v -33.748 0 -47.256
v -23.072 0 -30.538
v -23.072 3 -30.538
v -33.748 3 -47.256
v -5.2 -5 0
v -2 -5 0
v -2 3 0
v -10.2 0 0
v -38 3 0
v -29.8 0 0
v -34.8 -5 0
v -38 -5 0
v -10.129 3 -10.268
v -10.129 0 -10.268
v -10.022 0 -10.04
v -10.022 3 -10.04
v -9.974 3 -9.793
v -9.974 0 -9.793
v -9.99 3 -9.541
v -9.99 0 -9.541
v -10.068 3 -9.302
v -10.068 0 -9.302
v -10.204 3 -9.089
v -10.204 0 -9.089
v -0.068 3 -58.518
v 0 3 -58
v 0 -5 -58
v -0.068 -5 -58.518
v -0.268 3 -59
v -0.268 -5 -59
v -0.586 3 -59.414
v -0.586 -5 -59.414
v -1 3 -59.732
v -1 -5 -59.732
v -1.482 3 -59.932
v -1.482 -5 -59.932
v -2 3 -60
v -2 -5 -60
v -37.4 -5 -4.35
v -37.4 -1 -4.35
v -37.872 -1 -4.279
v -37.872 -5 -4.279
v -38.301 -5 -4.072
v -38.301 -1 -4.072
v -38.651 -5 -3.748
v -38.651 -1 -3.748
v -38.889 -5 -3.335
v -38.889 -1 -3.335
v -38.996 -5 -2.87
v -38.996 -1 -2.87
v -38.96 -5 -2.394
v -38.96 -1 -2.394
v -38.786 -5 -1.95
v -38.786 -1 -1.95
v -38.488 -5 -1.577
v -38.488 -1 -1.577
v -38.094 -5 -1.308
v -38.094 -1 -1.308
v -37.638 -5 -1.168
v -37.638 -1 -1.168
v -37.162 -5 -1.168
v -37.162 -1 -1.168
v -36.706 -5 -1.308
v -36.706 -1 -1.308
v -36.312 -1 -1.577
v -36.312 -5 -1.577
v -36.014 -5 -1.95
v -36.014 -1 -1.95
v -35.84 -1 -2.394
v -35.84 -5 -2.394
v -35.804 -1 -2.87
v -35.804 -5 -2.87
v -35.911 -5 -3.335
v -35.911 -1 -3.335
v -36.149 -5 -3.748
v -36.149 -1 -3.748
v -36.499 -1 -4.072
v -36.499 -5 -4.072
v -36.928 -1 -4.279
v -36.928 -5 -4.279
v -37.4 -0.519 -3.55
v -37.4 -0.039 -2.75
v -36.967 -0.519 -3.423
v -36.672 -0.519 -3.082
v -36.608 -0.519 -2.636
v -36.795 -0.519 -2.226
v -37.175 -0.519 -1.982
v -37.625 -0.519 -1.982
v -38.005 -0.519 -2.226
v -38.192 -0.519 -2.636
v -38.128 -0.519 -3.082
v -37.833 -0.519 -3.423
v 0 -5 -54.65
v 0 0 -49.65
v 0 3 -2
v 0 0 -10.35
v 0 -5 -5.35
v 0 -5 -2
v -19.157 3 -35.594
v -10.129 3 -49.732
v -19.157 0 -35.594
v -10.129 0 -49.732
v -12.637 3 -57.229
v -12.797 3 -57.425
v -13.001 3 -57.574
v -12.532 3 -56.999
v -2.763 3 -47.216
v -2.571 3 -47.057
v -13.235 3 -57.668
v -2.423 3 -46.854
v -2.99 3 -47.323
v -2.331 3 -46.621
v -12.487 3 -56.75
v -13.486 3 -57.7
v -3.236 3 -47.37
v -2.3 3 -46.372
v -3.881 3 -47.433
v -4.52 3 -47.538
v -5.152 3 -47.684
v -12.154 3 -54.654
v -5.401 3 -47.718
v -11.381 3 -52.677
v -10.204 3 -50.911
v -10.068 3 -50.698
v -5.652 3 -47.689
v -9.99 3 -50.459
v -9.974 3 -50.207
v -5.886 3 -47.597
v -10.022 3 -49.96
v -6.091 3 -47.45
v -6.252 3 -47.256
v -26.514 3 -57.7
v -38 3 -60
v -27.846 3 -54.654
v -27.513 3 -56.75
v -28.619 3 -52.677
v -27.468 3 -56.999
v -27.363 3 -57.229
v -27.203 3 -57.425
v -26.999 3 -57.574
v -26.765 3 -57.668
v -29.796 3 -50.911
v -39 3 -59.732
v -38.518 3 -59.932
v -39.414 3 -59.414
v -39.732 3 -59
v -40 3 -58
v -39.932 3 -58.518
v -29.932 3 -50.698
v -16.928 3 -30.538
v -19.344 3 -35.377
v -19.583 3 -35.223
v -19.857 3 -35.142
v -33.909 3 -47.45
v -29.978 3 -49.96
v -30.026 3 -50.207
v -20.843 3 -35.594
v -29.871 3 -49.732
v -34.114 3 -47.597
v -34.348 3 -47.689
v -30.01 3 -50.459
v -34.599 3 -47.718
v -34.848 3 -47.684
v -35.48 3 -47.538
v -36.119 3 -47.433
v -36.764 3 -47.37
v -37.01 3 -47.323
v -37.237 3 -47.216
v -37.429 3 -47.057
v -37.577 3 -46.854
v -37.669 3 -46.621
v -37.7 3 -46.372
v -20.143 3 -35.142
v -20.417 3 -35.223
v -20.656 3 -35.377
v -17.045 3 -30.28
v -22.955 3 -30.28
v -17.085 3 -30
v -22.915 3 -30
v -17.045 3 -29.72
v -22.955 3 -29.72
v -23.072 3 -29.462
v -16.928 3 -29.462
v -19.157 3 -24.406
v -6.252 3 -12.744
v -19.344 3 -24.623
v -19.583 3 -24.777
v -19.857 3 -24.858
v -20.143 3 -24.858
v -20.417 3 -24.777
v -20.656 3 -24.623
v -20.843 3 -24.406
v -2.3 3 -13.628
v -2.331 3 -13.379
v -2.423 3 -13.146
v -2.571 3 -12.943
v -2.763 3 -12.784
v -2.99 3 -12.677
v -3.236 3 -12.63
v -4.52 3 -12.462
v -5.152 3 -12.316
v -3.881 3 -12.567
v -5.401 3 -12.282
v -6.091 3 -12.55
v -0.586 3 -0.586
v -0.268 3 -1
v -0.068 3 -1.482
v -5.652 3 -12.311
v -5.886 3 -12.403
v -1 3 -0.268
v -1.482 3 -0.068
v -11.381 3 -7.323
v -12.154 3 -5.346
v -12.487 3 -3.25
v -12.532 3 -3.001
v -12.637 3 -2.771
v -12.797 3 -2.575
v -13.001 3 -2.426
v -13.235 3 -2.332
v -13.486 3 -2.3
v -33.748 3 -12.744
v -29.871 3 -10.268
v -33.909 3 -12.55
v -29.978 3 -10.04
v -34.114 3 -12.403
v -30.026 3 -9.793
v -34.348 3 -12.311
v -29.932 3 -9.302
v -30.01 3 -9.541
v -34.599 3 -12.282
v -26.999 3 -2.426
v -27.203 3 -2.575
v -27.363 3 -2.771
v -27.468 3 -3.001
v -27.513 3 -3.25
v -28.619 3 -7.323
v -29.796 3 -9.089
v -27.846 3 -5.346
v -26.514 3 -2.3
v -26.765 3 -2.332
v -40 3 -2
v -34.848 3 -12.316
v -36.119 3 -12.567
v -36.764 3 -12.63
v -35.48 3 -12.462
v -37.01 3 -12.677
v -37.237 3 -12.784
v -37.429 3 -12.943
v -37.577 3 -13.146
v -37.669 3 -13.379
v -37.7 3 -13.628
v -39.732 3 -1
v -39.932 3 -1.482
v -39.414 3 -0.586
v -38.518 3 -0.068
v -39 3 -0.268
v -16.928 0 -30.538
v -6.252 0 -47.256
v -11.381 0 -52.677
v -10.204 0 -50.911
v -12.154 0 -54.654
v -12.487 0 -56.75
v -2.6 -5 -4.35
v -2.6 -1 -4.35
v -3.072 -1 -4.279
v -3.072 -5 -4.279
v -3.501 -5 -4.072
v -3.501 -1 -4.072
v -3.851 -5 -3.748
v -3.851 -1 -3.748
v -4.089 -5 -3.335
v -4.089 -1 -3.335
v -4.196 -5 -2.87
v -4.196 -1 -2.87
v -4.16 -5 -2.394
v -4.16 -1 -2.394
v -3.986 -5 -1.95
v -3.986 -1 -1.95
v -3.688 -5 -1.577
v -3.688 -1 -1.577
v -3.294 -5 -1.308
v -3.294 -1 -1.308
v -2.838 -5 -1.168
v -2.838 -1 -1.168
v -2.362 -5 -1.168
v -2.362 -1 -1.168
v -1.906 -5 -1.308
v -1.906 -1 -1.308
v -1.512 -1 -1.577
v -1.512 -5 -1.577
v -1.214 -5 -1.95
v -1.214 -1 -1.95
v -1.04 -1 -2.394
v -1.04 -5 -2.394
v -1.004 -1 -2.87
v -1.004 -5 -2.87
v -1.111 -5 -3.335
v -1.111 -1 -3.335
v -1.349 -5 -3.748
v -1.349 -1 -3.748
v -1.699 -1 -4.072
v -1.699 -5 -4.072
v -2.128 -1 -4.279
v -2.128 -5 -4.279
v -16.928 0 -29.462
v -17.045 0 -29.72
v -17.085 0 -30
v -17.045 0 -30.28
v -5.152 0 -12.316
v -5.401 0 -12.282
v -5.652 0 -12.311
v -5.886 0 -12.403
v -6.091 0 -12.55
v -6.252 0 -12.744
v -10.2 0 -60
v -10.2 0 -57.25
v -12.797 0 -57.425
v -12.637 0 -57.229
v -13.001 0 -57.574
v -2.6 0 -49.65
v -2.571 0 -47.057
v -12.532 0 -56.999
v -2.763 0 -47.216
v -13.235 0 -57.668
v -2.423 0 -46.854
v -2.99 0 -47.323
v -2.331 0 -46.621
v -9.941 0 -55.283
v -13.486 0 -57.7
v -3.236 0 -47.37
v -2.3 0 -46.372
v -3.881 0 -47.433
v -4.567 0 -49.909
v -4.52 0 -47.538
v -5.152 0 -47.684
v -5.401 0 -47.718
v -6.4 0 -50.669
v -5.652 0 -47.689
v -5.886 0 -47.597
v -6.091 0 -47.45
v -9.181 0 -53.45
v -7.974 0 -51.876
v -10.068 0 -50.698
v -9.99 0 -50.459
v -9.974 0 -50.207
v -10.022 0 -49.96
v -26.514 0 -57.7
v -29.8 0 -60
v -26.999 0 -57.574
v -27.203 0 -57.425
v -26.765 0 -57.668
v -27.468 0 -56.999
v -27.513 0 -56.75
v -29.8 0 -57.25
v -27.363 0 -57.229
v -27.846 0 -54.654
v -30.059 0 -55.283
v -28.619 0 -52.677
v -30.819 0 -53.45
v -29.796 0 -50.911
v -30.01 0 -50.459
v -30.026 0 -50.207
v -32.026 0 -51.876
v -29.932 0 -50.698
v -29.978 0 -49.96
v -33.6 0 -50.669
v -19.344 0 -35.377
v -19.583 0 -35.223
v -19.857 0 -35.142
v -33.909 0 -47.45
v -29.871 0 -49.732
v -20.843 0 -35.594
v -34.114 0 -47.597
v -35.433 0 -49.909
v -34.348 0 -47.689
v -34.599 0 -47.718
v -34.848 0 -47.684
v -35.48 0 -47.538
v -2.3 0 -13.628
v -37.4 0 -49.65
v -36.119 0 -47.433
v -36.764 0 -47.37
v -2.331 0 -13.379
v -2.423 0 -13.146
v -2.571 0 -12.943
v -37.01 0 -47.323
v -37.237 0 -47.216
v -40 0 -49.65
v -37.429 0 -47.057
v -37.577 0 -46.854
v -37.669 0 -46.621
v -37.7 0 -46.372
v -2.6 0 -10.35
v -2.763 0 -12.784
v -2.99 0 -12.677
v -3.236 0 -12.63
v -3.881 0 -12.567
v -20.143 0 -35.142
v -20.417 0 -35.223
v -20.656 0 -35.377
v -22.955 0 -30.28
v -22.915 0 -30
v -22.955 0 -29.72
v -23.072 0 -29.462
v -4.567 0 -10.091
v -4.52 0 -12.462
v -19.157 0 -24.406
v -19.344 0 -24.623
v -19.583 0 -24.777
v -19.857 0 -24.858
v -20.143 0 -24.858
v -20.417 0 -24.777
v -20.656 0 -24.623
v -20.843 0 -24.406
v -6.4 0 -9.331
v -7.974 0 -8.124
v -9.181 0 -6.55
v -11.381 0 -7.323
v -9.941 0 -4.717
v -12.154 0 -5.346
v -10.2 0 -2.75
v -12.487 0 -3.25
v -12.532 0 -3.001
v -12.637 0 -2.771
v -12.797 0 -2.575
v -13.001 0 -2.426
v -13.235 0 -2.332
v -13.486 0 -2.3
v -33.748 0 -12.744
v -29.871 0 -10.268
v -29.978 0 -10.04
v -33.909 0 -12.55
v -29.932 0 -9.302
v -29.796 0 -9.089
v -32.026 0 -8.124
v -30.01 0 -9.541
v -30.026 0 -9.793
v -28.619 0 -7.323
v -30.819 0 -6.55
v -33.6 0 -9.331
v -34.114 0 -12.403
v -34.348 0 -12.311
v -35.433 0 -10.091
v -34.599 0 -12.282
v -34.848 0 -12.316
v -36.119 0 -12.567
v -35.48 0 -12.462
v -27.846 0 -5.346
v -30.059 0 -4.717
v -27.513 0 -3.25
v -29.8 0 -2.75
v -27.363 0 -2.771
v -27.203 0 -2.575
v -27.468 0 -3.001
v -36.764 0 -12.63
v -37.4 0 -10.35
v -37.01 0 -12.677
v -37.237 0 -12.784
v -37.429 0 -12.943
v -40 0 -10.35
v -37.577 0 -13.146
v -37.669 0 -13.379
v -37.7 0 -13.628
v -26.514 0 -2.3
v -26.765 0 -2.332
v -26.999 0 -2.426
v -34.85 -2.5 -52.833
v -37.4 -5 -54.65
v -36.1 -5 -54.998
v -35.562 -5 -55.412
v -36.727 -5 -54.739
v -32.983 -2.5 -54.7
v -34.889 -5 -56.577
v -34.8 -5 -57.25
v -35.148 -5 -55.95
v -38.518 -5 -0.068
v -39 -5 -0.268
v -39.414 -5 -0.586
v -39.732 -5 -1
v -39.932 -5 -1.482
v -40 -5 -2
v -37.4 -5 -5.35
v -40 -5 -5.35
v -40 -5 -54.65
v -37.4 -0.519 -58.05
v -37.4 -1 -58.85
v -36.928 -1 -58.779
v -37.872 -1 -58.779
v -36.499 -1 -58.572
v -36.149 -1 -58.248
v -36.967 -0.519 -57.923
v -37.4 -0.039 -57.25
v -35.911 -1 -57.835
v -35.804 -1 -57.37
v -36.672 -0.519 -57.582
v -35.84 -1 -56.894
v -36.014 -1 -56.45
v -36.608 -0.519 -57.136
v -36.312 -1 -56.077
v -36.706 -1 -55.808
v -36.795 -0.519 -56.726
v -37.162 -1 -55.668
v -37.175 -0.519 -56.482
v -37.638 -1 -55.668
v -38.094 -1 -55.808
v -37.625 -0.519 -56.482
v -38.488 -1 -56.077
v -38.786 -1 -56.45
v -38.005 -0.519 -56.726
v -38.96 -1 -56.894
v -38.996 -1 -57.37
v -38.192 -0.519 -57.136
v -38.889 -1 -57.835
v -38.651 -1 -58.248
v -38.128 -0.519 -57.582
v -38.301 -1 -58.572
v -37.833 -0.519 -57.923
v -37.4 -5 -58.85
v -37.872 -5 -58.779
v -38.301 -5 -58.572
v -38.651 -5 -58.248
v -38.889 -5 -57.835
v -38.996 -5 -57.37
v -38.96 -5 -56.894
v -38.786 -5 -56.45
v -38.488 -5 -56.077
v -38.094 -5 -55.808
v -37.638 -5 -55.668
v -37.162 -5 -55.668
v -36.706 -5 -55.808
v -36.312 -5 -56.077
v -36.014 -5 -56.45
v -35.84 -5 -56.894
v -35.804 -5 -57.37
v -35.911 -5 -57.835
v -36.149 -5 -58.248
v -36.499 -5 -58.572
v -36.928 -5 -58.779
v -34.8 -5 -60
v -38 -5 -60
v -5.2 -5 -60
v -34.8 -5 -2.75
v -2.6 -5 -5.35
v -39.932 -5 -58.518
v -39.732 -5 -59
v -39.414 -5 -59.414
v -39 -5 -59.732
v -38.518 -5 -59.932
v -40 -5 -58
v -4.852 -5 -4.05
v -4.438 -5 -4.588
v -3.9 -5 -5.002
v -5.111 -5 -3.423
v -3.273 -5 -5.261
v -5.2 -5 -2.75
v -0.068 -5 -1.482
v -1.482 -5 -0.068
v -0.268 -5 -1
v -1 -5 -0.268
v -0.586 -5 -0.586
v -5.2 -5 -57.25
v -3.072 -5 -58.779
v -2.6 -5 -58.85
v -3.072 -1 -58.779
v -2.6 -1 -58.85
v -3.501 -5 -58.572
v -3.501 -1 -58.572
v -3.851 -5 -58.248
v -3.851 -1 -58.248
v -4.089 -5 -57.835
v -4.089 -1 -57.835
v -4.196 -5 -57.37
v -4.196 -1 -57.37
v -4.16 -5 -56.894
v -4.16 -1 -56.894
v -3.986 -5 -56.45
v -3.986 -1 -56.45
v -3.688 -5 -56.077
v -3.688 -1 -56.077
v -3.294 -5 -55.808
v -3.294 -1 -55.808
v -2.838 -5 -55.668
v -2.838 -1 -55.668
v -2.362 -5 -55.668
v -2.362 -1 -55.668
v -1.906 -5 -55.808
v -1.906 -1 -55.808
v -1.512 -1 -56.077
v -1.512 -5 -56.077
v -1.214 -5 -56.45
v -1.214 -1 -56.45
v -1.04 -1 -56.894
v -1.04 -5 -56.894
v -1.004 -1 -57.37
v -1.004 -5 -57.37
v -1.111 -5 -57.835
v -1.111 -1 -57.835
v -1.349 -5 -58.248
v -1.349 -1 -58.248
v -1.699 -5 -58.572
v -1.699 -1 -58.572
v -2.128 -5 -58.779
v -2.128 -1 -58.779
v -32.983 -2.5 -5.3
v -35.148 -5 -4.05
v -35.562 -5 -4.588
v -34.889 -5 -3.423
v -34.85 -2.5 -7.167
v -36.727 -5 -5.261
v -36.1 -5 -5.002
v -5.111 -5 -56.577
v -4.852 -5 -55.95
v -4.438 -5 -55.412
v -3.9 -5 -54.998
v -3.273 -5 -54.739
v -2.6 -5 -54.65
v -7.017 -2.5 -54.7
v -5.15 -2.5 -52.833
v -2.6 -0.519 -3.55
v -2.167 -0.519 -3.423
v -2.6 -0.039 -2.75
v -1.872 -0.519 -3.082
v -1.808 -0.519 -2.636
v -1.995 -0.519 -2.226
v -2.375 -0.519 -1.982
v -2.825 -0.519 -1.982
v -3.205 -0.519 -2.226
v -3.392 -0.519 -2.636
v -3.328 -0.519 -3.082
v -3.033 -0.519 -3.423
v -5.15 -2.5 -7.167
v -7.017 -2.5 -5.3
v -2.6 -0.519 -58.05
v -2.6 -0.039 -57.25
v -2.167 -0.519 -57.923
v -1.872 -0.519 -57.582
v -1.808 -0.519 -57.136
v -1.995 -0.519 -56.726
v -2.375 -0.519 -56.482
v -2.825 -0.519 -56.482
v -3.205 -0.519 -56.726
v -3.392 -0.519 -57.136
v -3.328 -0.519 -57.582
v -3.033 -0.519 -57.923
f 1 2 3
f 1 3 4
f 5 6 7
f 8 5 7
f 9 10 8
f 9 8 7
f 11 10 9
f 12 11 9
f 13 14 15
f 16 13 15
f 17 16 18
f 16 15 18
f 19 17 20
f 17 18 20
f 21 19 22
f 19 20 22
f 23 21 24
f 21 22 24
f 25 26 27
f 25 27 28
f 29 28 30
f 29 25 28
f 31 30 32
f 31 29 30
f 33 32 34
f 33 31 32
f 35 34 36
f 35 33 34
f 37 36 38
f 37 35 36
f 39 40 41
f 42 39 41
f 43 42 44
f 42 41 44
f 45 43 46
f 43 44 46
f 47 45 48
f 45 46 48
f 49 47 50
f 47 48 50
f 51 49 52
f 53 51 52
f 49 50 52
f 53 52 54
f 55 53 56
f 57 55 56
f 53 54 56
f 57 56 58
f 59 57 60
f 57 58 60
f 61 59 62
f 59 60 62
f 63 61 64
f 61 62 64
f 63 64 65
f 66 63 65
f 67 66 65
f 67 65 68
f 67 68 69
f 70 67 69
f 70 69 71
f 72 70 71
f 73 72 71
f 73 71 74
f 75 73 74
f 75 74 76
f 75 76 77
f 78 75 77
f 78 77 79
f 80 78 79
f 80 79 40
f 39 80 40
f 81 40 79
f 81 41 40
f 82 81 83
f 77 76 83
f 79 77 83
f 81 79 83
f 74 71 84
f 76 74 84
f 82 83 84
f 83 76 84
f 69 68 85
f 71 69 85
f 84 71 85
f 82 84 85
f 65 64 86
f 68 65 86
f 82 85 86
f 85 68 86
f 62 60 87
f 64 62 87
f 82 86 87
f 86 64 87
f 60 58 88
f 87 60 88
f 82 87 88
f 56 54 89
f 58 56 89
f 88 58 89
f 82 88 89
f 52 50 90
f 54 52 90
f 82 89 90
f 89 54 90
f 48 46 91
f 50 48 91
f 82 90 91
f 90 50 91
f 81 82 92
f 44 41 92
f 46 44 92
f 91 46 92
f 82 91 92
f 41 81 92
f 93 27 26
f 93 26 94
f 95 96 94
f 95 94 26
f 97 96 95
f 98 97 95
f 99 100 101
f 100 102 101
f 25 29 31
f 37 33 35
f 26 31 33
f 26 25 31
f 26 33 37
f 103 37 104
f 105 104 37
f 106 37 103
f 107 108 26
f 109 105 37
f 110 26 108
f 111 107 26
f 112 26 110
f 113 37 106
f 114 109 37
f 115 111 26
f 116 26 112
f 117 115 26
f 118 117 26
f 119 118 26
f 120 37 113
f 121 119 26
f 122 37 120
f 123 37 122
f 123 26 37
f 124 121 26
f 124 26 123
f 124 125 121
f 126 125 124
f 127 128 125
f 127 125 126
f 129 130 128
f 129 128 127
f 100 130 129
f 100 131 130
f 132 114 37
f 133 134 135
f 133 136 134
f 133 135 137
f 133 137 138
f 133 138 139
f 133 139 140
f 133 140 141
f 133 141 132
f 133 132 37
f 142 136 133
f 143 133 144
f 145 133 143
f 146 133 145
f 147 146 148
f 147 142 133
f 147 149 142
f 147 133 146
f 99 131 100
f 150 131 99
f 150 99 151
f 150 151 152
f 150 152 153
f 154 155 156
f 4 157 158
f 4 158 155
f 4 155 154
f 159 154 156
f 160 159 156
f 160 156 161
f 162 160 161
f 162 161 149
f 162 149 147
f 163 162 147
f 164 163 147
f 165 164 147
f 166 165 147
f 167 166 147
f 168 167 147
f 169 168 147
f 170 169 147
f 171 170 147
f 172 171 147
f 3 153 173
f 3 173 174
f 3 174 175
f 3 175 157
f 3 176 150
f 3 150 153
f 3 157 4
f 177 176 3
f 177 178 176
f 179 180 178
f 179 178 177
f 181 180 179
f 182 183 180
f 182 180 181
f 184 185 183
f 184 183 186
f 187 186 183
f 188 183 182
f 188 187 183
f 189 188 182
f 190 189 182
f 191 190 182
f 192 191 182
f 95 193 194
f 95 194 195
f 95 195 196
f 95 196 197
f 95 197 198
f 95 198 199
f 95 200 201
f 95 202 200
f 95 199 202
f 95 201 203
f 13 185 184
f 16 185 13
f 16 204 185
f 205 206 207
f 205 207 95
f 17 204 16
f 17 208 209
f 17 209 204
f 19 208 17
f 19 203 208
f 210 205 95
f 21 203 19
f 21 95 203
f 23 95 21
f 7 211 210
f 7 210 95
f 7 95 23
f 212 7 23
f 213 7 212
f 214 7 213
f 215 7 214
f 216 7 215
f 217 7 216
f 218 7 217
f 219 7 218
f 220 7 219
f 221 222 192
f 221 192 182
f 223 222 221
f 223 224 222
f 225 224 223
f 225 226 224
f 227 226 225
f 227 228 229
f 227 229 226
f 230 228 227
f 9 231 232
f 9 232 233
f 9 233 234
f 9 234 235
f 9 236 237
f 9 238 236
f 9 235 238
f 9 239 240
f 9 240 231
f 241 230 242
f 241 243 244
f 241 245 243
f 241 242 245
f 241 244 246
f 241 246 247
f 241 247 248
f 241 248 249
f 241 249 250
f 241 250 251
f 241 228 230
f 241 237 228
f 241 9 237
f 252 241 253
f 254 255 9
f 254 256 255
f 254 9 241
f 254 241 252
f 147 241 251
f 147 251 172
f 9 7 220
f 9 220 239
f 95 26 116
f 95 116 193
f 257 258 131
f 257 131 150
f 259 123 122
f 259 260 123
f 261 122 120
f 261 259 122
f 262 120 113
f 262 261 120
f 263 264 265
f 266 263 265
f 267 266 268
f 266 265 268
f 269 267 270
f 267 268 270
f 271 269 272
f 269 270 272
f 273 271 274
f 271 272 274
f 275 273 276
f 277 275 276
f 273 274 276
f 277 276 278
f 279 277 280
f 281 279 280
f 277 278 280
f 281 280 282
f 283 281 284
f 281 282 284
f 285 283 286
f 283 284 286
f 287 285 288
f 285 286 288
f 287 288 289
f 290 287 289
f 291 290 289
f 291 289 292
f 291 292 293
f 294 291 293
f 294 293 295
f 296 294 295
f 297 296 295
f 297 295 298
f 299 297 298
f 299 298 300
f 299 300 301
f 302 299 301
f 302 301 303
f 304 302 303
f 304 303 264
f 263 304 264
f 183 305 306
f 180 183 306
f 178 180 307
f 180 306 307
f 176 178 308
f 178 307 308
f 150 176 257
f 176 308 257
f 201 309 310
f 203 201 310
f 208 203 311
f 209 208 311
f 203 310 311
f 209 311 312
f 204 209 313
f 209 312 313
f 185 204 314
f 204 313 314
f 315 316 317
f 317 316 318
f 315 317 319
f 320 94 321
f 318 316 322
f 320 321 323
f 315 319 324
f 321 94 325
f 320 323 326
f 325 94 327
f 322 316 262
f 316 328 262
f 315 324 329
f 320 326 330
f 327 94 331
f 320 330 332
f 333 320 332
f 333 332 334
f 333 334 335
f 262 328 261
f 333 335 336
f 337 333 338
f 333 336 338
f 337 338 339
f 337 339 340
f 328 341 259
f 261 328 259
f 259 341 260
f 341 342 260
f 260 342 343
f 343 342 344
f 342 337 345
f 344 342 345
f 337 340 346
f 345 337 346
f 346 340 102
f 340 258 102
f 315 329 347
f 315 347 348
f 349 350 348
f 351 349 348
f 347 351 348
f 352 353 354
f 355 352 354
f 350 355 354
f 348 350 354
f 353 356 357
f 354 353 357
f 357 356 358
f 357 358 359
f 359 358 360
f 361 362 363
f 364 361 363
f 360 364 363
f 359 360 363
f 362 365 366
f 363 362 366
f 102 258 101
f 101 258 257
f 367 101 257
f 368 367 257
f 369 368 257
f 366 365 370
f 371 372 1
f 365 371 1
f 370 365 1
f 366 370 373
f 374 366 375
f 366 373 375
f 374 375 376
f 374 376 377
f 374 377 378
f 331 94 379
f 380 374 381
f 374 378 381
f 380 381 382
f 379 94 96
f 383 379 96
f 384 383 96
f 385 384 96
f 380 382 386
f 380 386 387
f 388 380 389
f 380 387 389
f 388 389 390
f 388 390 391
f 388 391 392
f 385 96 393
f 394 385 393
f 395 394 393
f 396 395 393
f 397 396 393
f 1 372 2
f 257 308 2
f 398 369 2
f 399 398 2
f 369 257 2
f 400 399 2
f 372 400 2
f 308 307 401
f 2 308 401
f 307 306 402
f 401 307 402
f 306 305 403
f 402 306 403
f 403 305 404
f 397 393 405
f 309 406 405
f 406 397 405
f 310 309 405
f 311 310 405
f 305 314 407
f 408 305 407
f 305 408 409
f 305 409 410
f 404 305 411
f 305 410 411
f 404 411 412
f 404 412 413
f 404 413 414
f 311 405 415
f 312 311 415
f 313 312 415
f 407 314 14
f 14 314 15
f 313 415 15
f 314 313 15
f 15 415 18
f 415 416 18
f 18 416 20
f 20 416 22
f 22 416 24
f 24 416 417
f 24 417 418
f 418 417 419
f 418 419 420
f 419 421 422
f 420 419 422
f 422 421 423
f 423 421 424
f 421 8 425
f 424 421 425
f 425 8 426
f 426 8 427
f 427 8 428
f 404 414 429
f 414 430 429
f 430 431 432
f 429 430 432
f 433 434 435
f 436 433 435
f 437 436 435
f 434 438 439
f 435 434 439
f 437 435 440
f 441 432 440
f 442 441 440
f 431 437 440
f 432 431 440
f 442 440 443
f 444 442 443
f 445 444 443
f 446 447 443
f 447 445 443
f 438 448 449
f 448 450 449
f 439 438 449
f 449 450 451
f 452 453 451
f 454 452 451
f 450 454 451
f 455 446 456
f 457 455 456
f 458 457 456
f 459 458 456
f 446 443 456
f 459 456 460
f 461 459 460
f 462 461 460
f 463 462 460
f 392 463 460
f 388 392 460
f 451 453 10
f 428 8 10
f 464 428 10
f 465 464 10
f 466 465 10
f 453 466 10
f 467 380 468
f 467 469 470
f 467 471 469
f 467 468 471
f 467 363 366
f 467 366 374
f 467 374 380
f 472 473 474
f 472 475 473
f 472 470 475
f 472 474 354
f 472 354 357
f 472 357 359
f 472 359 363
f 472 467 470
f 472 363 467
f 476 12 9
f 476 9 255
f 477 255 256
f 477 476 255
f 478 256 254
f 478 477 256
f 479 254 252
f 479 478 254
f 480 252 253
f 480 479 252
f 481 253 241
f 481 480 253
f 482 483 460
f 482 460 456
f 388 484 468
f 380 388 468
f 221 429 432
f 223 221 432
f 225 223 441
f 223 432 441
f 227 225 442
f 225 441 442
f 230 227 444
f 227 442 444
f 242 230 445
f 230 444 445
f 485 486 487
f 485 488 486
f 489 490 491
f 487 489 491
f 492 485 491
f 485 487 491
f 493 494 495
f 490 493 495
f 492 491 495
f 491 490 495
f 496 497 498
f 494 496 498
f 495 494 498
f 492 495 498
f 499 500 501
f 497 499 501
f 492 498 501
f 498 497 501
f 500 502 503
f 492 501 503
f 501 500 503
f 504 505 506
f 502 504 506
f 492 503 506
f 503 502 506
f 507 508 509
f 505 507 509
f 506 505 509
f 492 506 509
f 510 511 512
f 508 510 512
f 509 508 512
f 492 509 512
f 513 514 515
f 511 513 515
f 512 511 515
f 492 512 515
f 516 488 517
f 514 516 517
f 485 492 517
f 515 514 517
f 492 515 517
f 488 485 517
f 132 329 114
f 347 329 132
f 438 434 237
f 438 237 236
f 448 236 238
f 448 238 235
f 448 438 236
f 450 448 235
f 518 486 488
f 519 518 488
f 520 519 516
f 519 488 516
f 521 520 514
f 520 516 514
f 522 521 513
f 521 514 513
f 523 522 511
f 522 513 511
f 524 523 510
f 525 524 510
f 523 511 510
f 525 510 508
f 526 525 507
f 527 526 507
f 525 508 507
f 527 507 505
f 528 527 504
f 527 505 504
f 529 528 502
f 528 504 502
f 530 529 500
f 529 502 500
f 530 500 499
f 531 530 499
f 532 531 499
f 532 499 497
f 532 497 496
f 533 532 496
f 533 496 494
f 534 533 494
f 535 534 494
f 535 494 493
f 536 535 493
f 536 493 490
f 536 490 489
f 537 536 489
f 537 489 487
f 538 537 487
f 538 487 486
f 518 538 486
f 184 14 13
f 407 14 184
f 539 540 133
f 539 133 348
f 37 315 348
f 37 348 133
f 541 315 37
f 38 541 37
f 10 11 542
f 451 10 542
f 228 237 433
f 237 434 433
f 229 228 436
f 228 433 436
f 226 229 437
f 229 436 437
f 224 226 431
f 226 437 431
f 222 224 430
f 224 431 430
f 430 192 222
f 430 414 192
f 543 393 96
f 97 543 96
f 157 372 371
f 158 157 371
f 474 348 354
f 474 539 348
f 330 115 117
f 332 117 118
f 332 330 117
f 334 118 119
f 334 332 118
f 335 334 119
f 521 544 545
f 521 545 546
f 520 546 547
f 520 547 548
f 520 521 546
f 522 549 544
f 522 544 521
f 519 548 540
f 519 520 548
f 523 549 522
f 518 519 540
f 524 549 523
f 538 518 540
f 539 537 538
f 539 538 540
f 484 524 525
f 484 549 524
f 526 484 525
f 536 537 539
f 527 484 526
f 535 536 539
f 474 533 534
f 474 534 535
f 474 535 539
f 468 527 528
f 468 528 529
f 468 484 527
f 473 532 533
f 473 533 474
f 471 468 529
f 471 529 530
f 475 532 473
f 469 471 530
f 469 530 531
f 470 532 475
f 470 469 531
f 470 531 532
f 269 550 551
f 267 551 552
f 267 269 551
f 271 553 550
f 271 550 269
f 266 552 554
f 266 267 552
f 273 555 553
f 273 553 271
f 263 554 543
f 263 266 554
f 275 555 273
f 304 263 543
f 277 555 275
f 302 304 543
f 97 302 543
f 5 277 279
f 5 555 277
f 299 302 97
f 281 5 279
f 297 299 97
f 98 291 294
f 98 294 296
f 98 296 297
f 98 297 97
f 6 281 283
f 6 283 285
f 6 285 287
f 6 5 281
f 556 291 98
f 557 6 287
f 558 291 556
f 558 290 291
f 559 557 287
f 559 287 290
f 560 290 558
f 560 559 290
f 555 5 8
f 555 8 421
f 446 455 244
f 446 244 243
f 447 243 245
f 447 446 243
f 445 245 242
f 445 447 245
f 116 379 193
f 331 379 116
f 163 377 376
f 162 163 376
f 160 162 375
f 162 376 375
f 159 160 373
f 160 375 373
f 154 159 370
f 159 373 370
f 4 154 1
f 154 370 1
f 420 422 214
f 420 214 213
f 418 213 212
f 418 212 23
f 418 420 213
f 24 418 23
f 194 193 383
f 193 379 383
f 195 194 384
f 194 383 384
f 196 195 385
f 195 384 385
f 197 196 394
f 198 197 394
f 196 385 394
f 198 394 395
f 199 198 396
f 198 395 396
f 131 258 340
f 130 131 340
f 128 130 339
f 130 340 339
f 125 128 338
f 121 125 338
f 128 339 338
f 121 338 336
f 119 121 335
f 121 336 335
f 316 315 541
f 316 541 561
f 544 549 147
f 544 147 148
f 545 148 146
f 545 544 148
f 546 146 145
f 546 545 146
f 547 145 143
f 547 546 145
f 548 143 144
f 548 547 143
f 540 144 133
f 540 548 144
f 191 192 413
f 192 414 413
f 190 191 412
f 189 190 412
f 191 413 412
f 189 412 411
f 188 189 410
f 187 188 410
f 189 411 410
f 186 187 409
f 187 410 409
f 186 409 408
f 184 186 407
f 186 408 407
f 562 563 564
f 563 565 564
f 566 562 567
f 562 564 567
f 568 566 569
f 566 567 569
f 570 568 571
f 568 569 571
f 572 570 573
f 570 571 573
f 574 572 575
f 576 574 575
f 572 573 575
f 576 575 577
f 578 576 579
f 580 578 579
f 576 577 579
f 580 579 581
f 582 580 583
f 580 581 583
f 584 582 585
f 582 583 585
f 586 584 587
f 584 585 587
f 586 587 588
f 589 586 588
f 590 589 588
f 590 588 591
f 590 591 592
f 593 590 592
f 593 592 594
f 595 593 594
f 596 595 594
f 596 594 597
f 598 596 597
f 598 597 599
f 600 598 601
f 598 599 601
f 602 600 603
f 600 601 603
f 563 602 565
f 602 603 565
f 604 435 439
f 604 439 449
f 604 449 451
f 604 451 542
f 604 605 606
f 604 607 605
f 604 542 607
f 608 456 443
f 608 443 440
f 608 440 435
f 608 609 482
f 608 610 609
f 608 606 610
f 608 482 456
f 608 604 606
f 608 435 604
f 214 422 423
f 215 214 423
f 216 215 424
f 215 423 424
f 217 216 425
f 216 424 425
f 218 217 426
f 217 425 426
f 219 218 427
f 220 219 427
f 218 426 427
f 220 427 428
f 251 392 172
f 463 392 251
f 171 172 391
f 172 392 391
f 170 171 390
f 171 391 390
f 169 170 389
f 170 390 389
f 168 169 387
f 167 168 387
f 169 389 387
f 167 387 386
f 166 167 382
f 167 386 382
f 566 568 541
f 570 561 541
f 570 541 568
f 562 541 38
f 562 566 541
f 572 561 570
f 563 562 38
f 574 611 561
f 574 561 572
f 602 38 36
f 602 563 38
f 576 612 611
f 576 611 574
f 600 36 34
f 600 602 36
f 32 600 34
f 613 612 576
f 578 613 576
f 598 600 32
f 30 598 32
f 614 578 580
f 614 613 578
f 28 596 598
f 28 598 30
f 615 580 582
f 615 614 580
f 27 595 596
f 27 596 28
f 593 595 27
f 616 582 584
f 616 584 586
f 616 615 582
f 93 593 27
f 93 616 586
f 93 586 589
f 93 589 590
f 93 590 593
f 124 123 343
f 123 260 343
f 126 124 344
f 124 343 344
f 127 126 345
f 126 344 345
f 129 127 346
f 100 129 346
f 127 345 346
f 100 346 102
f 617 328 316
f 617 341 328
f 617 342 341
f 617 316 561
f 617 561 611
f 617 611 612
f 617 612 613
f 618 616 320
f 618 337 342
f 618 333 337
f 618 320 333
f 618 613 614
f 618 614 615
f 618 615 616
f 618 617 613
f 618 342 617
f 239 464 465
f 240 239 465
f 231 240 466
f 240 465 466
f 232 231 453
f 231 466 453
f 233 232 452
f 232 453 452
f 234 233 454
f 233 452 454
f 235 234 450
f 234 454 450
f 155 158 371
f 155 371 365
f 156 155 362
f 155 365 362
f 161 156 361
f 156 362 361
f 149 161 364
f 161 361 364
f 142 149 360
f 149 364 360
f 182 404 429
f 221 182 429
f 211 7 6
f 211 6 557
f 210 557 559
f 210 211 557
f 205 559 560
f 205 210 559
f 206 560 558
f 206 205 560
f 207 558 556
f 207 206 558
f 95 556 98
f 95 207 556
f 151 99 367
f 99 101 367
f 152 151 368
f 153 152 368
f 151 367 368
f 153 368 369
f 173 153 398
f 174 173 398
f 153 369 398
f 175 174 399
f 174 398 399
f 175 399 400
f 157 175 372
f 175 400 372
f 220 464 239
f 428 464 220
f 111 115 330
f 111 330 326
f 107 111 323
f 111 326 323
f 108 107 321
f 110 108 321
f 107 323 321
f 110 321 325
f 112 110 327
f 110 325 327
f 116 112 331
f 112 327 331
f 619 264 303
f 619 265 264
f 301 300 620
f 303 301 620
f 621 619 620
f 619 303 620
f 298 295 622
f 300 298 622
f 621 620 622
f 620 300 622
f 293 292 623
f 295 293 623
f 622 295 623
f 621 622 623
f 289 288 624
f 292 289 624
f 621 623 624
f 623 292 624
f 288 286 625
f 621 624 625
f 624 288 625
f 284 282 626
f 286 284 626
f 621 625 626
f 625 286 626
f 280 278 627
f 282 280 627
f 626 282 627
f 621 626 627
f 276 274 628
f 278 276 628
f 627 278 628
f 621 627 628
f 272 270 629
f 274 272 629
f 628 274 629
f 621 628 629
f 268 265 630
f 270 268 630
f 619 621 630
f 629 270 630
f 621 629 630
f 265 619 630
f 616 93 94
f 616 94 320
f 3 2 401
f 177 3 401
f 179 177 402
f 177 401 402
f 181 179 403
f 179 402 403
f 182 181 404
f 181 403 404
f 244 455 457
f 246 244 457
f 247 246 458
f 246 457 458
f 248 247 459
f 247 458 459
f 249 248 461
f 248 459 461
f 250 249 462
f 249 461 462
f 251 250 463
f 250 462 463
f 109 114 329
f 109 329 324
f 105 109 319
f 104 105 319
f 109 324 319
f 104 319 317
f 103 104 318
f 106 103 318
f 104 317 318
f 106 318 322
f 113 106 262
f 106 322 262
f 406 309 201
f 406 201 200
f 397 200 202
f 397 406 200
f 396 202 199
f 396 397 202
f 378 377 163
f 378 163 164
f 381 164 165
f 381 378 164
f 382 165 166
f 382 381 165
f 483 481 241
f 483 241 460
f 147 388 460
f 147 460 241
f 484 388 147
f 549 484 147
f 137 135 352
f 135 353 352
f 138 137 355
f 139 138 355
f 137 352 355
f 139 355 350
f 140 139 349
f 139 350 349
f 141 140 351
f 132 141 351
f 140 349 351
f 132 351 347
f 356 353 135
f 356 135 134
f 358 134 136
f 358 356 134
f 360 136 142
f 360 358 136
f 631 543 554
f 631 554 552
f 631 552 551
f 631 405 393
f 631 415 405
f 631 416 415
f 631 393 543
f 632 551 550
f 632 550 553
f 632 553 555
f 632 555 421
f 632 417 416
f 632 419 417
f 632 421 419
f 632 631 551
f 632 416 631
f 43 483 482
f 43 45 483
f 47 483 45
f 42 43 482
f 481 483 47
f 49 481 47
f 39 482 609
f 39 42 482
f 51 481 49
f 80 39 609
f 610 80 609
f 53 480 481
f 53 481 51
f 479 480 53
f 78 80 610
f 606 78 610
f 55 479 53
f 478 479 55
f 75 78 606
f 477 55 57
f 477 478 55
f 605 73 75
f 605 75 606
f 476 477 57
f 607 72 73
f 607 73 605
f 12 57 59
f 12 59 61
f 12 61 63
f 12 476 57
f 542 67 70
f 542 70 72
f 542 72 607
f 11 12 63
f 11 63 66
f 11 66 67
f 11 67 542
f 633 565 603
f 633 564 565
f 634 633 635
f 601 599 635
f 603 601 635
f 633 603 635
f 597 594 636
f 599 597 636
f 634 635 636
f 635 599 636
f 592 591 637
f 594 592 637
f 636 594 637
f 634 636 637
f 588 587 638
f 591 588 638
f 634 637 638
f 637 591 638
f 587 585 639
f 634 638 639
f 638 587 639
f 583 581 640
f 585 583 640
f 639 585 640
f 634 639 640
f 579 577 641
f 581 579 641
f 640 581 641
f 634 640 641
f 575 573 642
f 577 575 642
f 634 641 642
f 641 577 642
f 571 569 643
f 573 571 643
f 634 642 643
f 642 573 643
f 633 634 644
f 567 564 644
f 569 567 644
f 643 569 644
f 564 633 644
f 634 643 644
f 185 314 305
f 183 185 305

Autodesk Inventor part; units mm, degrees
ref_plane "YZ Plane" through (0, 0, 0) normal (1, 0, 0) x (0, 1, 0)
ref_plane "XZ Plane" through (0, 0, 0) normal (0, 1, 0) x (-1, 0, 0)
ref_plane "XY Plane" through (0, 0, 0) normal (0, 0, 1) x (1, 0, 0)
sketch "Sketch1" plane through (0, 0, 0) normal (0, 1, 0) x (-1, 0, 0)
  line L0 (0, 0) -> (40, 0)
  line L1 (40, 0) -> (40, -60)
  line L2 (40, -60) -> (0, -60)
  line L3 (0, -60) -> (0, 0)
  circle A0 centre (2.6, -2.75) radius 1.27
  circle A1 centre (37.4, -2.75) radius 1.27
  circle A2 centre (37.4, -57.25) radius 1.27
  circle A3 centre (2.6, -57.25) radius 1.27
  dimension "d1" = 40
  dimension "d2" = 60
  dimension "d15" = 2.54
  dimension "d20" = 2.75
  dimension "d21" = 2.6
  dimension "d22" = 2.54
  dimension "d23" = 2.75
  dimension "d24" = 2.6
  dimension "d25" = 2.54
  dimension "d26" = 2.54
  dimension "d27" = 2.75
  dimension "d28" = 2.75
  dimension "d29" = 2.6
  dimension "d30" = 2.6
extrude "Extrusion1" add sketch "Sketch1" along normal blind 3 contours L0 L1 L2 L3 | A0 | A1 | A2 | A3
sketch "Sketch2" plane through (0, 0, 0) normal (0, -1, 0) x (1, 0, 0)
  line L0 (-40, 0) -> (0, 0) projected
  line L1 (0, -60) -> (-40, -60) projected
  arc A0 (-5.2, -2.75) -> (-2.6, -5.35) centre (-2.6, -2.75) ccw
  line L2 (0, 0) -> (0, -60) projected
  arc A1 (-2.6, -54.65) -> (-5.2, -57.25) centre (-2.6, -57.25) ccw
  arc A2 (-34.8, -57.25) -> (-37.4, -54.65) centre (-37.4, -57.25) ccw
  line L3 (-40, -60) -> (-40, 0) projected
  arc A3 (-37.4, -5.35) -> (-34.8, -2.75) centre (-37.4, -2.75) ccw
  line L4 (-34.8, -57.25) -> (-34.8, -60)
  line L5 (-34.8, -2.75) -> (-34.8, 0)
  line L6 (-5.2, -57.25) -> (-5.2, -60)
  line L7 (-5.2, -2.75) -> (-5.2, 0)
  line L8 (-37.4, -54.65) -> (-40, -54.65)
  line L9 (0, -5.35) -> (-2.6, -5.35)
  line L10 (-37.4, -5.35) -> (-40, -5.35)
  line L11 (-40, -54.65) -> (-37.4, -54.65)
  line L12 (-2.6, -54.65) -> (0, -54.65)
extrude "Extrusion2" add sketch "Sketch2" along normal blind 5 contours L0 L5 A3 L10 L3 | L0 L2 L9 A0 L7 | L8 A2 L4 L1 L3 | L2 L1 L6 A1 L12
sketch "Sketch4" plane through (0, -5, 0) normal (0, -1, 0) x (1, 0, 0)
  arc A0 (-2.6, -54.65) -> (-5.2, -57.25) centre (-2.6, -57.25) ccw projected
  arc A1 (-34.8, -57.25) -> (-37.4, -54.65) centre (-37.4, -57.25) ccw projected
  arc A2 (-5.2, -2.75) -> (-2.6, -5.35) centre (-2.6, -2.75) ccw projected
  arc A3 (-37.4, -5.35) -> (-34.8, -2.75) centre (-37.4, -2.75) ccw projected
  point P0 (0, 0)
hole "Hole2" at (-2.6, -5, -57.25) at (-37.4, -5, -57.25) at (-2.6, -5, -2.75) at (-37.4, -5, -2.75) direction (0, 1, 0) diameter 3.2 depth 4 tip angle 118
chamfer "Chamfer1" distance 5 angle 45 12 edges at (-1.3, 0, -54.65) (-4.4385, 0, -55.4115) (-5.2, 0, -58.625) (-35.5615, 0, -55.4115) (-34.8, 0, -58.625) (-38.7, 0, -54.65) (-35.5615, 0, -4.5885) (-38.7, 0, -5.35) (-34.8, 0, -1.375) (-1.3, 0, -5.35) (-4.4385, 0, -4.5885) (-5.2, 0, -1.375)
sketch "Sketch5" plane through (0, 0, 0) normal (0, -1, 0) x (1, 0, 0)
  line L0 (-10.2, 0) -> (-10.2, -2.75) projected
  line L1 (-29.8, 0) -> (-10.2, 0) projected
  line L2 (-29.8, -2.75) -> (-29.8, 0) projected
  arc A0 (-37.4, -10.35) -> (-29.8, -2.75) centre (-37.4, -2.75) ccw projected
  line L3 (-40, -10.35) -> (-37.4, -10.35) projected
  line L4 (-40, -49.65) -> (-40, -10.35) projected
  line L5 (-37.4, -49.65) -> (-40, -49.65) projected
  arc A1 (-29.8, -57.25) -> (-37.4, -49.65) centre (-37.4, -57.25) ccw projected
  line L6 (-29.8, -60) -> (-29.8, -57.25) projected
  line L7 (-10.2, -60) -> (-29.8, -60) projected
  line L8 (-10.2, -57.25) -> (-10.2, -60) projected
  arc A2 (-2.6, -49.65) -> (-10.2, -57.25) centre (-2.6, -57.25) ccw projected
  line L9 (0, -49.65) -> (-2.6, -49.65) projected
  line L10 (0, -10.35) -> (0, -49.65) projected
  line L11 (-2.6, -10.35) -> (0, -10.35) projected
  arc A3 (-10.2, -2.75) -> (-2.6, -10.35) centre (-2.6, -2.75) ccw projected
  line L12 (-12.5, -57.25) -> (-12.5, -57.7)
  line L13 (-13.4861, -57.7) -> (-26.5139, -57.7)
  line L14 (-27.5, -57.7) -> (-27.5, -57.25)
  line L15 (-37.4, -47.35) -> (-37.7, -47.35)
  line L16 (-37.7, -46.3725) -> (-37.7, -13.6275)
  line L17 (-37.7, -12.65) -> (-37.4, -12.65)
  line L18 (-27.5, -2.75) -> (-27.5, -2.3)
  line L19 (-26.5139, -2.3) -> (-13.4861, -2.3)
  line L20 (-12.5, -2.3) -> (-12.5, -2.75)
  line L21 (-2.6, -12.65) -> (-2.3, -12.65)
  line L22 (-2.3, -13.6275) -> (-2.3, -46.3725)
  line L23 (-2.3, -47.35) -> (-2.6, -47.35)
  line L24 (0, -60) -> (-40, -60) projected
  arc A4 (-5.2, -2.75) -> (-2.6, -5.35) centre (-2.6, -2.75) ccw projected
  circle A5 centre (-37.4, -2.75) radius 1.6 projected
  line L25 (-0.6615, -56.0122) -> (-2.3, -53.4461)
  line L26 (-4.5385, -58.4878) -> (-5.0416, -57.7)
  line L27 (-34.9584, -57.7) -> (-35.4615, -58.4878)
  line L28 (-37.7, -53.4461) -> (-39.3385, -56.0122)
  arc A6 (-3.2358, -47.3704) -> (-5.1517, -47.6845) centre (-2.6, -57.25) ccw
  arc A7 (-10.2041, -50.9106) -> (-12.4874, -56.7505) centre (-2.6, -57.25) ccw
  arc A8 (-27.5126, -56.7505) -> (-29.7959, -50.9106) centre (-37.4, -57.25) ccw
  arc A9 (-34.8483, -47.6845) -> (-36.7642, -47.3704) centre (-37.4, -57.25) ccw
  arc A10 (-36.7642, -12.6296) -> (-34.8483, -12.3155) centre (-37.4, -2.75) ccw
  arc A11 (-29.7959, -9.0894) -> (-27.5126, -3.2495) centre (-37.4, -2.75) ccw
  arc A12 (-12.4874, -3.2495) -> (-10.2041, -9.0894) centre (-2.6, -2.75) ccw
  arc A13 (-5.1517, -12.3155) -> (-3.2358, -12.6296) centre (-2.6, -2.75) ccw
  line L29 (-6.2523, -47.2565) -> (-16.9275, -30.5382)
  line L30 (-20.8428, -24.4063) -> (-29.8707, -10.2679)
  line L31 (-6.2523, -12.7435) -> (-16.9275, -29.4618)
  line L32 (-20.8428, -35.5937) -> (-29.8707, -49.7321)
  line L33 (-10.1293, -49.7321) -> (-19.1572, -35.5937)
  line L34 (-23.0725, -29.4618) -> (-33.7477, -12.7435)
  line L35 (-10.1293, -10.2679) -> (-19.1572, -24.4063)
  line L36 (-23.0725, -30.5382) -> (-33.7477, -47.2565)
  arc A14 (-3.2358, -47.3704) -> (-2.3, -46.3725) centre (-3.3, -46.3725) ccw
  arc A15 (-6.2523, -47.2565) -> (-5.1517, -47.6845) centre (-5.4095, -46.7183) ccw
  arc A16 (-10.2041, -50.9106) -> (-10.1293, -49.7321) centre (-10.9722, -50.2703) ccw
  arc A17 (-13.4861, -57.7) -> (-12.4874, -56.7505) centre (-13.4861, -56.7) ccw
  arc A18 (-27.5126, -56.7505) -> (-26.5139, -57.7) centre (-26.5139, -56.7) ccw
  arc A19 (-29.8707, -49.7321) -> (-29.7959, -50.9106) centre (-29.0278, -50.2703) ccw
  arc A20 (-34.8483, -47.6845) -> (-33.7477, -47.2565) centre (-34.5905, -46.7183) ccw
  arc A21 (-37.7, -46.3725) -> (-36.7642, -47.3704) centre (-36.7, -46.3725) ccw
  arc A22 (-36.7642, -12.6296) -> (-37.7, -13.6275) centre (-36.7, -13.6275) ccw
  arc A23 (-33.7477, -12.7435) -> (-34.8483, -12.3155) centre (-34.5905, -13.2817) ccw
  arc A24 (-23.0725, -30.5382) -> (-23.0725, -29.4618) centre (-23.9154, -30) ccw
  arc A25 (-19.1572, -35.5937) -> (-20.8428, -35.5937) centre (-20, -36.1318) ccw
  arc A26 (-16.9275, -29.4618) -> (-16.9275, -30.5382) centre (-16.0846, -30) ccw
  arc A27 (-20.8428, -24.4063) -> (-19.1572, -24.4063) centre (-20, -23.8682) ccw
  arc A28 (-5.1517, -12.3155) -> (-6.2523, -12.7435) centre (-5.4095, -13.2817) ccw
  arc A29 (-2.3, -13.6275) -> (-3.2358, -12.6296) centre (-3.3, -13.6275) ccw
  arc A30 (-10.1293, -10.2679) -> (-10.2041, -9.0894) centre (-10.9722, -9.7297) ccw
  arc A31 (-12.4874, -3.2495) -> (-13.4861, -2.3) centre (-13.4861, -3.3) ccw
  arc A32 (-26.5139, -2.3) -> (-27.5126, -3.2495) centre (-26.5139, -3.3) ccw
  arc A33 (-29.7959, -9.0894) -> (-29.8707, -10.2679) centre (-29.0278, -9.7297) ccw
  point P0 (0, 0)
  point P1 (-34.1564, -12.1035)
  point P2 (-30.2793, -9.6279)
  point P3 (-5.8436, -12.1035)
  point P4 (-9.7207, -9.6279)
  point P5 (-5.8436, -47.8965)
  point P6 (-9.7207, -50.3721)
  point P7 (-30.2793, -50.3721)
  point P8 (-34.1564, -47.8965)
  dimension "d57" = 1
extrude "Extrusion3" cut sketch "Sketch5" against normal through all contours L13 A18 A8 A19 L32 A25 L33 A16 A7 A17 | L16 A22 A10 A23 L34 A24 L36 A20 A9 A21 | L19 A31 A12 A30 L35 A27 L30 A33 A11 A32 | L22 A14 A6 A15 L29 A26 L31 A28 A13 A29
fillet "Fillet1" [suppressed]
fillet "Fillet2" radius 2 4 edges at (-40, -1, 0) (-40, -1, -60) (0, -1, -60) (0, -1, 0)
equation "\"d23\" = d20"
equation "\"d24\" = d21"
equation "\"d27\" = d23"
equation "\"d28\" = d20"
equation "\"d29\" = d21"
equation "\"d30\" = d21"
properties part number "Test_PCB_Board_4x6"
